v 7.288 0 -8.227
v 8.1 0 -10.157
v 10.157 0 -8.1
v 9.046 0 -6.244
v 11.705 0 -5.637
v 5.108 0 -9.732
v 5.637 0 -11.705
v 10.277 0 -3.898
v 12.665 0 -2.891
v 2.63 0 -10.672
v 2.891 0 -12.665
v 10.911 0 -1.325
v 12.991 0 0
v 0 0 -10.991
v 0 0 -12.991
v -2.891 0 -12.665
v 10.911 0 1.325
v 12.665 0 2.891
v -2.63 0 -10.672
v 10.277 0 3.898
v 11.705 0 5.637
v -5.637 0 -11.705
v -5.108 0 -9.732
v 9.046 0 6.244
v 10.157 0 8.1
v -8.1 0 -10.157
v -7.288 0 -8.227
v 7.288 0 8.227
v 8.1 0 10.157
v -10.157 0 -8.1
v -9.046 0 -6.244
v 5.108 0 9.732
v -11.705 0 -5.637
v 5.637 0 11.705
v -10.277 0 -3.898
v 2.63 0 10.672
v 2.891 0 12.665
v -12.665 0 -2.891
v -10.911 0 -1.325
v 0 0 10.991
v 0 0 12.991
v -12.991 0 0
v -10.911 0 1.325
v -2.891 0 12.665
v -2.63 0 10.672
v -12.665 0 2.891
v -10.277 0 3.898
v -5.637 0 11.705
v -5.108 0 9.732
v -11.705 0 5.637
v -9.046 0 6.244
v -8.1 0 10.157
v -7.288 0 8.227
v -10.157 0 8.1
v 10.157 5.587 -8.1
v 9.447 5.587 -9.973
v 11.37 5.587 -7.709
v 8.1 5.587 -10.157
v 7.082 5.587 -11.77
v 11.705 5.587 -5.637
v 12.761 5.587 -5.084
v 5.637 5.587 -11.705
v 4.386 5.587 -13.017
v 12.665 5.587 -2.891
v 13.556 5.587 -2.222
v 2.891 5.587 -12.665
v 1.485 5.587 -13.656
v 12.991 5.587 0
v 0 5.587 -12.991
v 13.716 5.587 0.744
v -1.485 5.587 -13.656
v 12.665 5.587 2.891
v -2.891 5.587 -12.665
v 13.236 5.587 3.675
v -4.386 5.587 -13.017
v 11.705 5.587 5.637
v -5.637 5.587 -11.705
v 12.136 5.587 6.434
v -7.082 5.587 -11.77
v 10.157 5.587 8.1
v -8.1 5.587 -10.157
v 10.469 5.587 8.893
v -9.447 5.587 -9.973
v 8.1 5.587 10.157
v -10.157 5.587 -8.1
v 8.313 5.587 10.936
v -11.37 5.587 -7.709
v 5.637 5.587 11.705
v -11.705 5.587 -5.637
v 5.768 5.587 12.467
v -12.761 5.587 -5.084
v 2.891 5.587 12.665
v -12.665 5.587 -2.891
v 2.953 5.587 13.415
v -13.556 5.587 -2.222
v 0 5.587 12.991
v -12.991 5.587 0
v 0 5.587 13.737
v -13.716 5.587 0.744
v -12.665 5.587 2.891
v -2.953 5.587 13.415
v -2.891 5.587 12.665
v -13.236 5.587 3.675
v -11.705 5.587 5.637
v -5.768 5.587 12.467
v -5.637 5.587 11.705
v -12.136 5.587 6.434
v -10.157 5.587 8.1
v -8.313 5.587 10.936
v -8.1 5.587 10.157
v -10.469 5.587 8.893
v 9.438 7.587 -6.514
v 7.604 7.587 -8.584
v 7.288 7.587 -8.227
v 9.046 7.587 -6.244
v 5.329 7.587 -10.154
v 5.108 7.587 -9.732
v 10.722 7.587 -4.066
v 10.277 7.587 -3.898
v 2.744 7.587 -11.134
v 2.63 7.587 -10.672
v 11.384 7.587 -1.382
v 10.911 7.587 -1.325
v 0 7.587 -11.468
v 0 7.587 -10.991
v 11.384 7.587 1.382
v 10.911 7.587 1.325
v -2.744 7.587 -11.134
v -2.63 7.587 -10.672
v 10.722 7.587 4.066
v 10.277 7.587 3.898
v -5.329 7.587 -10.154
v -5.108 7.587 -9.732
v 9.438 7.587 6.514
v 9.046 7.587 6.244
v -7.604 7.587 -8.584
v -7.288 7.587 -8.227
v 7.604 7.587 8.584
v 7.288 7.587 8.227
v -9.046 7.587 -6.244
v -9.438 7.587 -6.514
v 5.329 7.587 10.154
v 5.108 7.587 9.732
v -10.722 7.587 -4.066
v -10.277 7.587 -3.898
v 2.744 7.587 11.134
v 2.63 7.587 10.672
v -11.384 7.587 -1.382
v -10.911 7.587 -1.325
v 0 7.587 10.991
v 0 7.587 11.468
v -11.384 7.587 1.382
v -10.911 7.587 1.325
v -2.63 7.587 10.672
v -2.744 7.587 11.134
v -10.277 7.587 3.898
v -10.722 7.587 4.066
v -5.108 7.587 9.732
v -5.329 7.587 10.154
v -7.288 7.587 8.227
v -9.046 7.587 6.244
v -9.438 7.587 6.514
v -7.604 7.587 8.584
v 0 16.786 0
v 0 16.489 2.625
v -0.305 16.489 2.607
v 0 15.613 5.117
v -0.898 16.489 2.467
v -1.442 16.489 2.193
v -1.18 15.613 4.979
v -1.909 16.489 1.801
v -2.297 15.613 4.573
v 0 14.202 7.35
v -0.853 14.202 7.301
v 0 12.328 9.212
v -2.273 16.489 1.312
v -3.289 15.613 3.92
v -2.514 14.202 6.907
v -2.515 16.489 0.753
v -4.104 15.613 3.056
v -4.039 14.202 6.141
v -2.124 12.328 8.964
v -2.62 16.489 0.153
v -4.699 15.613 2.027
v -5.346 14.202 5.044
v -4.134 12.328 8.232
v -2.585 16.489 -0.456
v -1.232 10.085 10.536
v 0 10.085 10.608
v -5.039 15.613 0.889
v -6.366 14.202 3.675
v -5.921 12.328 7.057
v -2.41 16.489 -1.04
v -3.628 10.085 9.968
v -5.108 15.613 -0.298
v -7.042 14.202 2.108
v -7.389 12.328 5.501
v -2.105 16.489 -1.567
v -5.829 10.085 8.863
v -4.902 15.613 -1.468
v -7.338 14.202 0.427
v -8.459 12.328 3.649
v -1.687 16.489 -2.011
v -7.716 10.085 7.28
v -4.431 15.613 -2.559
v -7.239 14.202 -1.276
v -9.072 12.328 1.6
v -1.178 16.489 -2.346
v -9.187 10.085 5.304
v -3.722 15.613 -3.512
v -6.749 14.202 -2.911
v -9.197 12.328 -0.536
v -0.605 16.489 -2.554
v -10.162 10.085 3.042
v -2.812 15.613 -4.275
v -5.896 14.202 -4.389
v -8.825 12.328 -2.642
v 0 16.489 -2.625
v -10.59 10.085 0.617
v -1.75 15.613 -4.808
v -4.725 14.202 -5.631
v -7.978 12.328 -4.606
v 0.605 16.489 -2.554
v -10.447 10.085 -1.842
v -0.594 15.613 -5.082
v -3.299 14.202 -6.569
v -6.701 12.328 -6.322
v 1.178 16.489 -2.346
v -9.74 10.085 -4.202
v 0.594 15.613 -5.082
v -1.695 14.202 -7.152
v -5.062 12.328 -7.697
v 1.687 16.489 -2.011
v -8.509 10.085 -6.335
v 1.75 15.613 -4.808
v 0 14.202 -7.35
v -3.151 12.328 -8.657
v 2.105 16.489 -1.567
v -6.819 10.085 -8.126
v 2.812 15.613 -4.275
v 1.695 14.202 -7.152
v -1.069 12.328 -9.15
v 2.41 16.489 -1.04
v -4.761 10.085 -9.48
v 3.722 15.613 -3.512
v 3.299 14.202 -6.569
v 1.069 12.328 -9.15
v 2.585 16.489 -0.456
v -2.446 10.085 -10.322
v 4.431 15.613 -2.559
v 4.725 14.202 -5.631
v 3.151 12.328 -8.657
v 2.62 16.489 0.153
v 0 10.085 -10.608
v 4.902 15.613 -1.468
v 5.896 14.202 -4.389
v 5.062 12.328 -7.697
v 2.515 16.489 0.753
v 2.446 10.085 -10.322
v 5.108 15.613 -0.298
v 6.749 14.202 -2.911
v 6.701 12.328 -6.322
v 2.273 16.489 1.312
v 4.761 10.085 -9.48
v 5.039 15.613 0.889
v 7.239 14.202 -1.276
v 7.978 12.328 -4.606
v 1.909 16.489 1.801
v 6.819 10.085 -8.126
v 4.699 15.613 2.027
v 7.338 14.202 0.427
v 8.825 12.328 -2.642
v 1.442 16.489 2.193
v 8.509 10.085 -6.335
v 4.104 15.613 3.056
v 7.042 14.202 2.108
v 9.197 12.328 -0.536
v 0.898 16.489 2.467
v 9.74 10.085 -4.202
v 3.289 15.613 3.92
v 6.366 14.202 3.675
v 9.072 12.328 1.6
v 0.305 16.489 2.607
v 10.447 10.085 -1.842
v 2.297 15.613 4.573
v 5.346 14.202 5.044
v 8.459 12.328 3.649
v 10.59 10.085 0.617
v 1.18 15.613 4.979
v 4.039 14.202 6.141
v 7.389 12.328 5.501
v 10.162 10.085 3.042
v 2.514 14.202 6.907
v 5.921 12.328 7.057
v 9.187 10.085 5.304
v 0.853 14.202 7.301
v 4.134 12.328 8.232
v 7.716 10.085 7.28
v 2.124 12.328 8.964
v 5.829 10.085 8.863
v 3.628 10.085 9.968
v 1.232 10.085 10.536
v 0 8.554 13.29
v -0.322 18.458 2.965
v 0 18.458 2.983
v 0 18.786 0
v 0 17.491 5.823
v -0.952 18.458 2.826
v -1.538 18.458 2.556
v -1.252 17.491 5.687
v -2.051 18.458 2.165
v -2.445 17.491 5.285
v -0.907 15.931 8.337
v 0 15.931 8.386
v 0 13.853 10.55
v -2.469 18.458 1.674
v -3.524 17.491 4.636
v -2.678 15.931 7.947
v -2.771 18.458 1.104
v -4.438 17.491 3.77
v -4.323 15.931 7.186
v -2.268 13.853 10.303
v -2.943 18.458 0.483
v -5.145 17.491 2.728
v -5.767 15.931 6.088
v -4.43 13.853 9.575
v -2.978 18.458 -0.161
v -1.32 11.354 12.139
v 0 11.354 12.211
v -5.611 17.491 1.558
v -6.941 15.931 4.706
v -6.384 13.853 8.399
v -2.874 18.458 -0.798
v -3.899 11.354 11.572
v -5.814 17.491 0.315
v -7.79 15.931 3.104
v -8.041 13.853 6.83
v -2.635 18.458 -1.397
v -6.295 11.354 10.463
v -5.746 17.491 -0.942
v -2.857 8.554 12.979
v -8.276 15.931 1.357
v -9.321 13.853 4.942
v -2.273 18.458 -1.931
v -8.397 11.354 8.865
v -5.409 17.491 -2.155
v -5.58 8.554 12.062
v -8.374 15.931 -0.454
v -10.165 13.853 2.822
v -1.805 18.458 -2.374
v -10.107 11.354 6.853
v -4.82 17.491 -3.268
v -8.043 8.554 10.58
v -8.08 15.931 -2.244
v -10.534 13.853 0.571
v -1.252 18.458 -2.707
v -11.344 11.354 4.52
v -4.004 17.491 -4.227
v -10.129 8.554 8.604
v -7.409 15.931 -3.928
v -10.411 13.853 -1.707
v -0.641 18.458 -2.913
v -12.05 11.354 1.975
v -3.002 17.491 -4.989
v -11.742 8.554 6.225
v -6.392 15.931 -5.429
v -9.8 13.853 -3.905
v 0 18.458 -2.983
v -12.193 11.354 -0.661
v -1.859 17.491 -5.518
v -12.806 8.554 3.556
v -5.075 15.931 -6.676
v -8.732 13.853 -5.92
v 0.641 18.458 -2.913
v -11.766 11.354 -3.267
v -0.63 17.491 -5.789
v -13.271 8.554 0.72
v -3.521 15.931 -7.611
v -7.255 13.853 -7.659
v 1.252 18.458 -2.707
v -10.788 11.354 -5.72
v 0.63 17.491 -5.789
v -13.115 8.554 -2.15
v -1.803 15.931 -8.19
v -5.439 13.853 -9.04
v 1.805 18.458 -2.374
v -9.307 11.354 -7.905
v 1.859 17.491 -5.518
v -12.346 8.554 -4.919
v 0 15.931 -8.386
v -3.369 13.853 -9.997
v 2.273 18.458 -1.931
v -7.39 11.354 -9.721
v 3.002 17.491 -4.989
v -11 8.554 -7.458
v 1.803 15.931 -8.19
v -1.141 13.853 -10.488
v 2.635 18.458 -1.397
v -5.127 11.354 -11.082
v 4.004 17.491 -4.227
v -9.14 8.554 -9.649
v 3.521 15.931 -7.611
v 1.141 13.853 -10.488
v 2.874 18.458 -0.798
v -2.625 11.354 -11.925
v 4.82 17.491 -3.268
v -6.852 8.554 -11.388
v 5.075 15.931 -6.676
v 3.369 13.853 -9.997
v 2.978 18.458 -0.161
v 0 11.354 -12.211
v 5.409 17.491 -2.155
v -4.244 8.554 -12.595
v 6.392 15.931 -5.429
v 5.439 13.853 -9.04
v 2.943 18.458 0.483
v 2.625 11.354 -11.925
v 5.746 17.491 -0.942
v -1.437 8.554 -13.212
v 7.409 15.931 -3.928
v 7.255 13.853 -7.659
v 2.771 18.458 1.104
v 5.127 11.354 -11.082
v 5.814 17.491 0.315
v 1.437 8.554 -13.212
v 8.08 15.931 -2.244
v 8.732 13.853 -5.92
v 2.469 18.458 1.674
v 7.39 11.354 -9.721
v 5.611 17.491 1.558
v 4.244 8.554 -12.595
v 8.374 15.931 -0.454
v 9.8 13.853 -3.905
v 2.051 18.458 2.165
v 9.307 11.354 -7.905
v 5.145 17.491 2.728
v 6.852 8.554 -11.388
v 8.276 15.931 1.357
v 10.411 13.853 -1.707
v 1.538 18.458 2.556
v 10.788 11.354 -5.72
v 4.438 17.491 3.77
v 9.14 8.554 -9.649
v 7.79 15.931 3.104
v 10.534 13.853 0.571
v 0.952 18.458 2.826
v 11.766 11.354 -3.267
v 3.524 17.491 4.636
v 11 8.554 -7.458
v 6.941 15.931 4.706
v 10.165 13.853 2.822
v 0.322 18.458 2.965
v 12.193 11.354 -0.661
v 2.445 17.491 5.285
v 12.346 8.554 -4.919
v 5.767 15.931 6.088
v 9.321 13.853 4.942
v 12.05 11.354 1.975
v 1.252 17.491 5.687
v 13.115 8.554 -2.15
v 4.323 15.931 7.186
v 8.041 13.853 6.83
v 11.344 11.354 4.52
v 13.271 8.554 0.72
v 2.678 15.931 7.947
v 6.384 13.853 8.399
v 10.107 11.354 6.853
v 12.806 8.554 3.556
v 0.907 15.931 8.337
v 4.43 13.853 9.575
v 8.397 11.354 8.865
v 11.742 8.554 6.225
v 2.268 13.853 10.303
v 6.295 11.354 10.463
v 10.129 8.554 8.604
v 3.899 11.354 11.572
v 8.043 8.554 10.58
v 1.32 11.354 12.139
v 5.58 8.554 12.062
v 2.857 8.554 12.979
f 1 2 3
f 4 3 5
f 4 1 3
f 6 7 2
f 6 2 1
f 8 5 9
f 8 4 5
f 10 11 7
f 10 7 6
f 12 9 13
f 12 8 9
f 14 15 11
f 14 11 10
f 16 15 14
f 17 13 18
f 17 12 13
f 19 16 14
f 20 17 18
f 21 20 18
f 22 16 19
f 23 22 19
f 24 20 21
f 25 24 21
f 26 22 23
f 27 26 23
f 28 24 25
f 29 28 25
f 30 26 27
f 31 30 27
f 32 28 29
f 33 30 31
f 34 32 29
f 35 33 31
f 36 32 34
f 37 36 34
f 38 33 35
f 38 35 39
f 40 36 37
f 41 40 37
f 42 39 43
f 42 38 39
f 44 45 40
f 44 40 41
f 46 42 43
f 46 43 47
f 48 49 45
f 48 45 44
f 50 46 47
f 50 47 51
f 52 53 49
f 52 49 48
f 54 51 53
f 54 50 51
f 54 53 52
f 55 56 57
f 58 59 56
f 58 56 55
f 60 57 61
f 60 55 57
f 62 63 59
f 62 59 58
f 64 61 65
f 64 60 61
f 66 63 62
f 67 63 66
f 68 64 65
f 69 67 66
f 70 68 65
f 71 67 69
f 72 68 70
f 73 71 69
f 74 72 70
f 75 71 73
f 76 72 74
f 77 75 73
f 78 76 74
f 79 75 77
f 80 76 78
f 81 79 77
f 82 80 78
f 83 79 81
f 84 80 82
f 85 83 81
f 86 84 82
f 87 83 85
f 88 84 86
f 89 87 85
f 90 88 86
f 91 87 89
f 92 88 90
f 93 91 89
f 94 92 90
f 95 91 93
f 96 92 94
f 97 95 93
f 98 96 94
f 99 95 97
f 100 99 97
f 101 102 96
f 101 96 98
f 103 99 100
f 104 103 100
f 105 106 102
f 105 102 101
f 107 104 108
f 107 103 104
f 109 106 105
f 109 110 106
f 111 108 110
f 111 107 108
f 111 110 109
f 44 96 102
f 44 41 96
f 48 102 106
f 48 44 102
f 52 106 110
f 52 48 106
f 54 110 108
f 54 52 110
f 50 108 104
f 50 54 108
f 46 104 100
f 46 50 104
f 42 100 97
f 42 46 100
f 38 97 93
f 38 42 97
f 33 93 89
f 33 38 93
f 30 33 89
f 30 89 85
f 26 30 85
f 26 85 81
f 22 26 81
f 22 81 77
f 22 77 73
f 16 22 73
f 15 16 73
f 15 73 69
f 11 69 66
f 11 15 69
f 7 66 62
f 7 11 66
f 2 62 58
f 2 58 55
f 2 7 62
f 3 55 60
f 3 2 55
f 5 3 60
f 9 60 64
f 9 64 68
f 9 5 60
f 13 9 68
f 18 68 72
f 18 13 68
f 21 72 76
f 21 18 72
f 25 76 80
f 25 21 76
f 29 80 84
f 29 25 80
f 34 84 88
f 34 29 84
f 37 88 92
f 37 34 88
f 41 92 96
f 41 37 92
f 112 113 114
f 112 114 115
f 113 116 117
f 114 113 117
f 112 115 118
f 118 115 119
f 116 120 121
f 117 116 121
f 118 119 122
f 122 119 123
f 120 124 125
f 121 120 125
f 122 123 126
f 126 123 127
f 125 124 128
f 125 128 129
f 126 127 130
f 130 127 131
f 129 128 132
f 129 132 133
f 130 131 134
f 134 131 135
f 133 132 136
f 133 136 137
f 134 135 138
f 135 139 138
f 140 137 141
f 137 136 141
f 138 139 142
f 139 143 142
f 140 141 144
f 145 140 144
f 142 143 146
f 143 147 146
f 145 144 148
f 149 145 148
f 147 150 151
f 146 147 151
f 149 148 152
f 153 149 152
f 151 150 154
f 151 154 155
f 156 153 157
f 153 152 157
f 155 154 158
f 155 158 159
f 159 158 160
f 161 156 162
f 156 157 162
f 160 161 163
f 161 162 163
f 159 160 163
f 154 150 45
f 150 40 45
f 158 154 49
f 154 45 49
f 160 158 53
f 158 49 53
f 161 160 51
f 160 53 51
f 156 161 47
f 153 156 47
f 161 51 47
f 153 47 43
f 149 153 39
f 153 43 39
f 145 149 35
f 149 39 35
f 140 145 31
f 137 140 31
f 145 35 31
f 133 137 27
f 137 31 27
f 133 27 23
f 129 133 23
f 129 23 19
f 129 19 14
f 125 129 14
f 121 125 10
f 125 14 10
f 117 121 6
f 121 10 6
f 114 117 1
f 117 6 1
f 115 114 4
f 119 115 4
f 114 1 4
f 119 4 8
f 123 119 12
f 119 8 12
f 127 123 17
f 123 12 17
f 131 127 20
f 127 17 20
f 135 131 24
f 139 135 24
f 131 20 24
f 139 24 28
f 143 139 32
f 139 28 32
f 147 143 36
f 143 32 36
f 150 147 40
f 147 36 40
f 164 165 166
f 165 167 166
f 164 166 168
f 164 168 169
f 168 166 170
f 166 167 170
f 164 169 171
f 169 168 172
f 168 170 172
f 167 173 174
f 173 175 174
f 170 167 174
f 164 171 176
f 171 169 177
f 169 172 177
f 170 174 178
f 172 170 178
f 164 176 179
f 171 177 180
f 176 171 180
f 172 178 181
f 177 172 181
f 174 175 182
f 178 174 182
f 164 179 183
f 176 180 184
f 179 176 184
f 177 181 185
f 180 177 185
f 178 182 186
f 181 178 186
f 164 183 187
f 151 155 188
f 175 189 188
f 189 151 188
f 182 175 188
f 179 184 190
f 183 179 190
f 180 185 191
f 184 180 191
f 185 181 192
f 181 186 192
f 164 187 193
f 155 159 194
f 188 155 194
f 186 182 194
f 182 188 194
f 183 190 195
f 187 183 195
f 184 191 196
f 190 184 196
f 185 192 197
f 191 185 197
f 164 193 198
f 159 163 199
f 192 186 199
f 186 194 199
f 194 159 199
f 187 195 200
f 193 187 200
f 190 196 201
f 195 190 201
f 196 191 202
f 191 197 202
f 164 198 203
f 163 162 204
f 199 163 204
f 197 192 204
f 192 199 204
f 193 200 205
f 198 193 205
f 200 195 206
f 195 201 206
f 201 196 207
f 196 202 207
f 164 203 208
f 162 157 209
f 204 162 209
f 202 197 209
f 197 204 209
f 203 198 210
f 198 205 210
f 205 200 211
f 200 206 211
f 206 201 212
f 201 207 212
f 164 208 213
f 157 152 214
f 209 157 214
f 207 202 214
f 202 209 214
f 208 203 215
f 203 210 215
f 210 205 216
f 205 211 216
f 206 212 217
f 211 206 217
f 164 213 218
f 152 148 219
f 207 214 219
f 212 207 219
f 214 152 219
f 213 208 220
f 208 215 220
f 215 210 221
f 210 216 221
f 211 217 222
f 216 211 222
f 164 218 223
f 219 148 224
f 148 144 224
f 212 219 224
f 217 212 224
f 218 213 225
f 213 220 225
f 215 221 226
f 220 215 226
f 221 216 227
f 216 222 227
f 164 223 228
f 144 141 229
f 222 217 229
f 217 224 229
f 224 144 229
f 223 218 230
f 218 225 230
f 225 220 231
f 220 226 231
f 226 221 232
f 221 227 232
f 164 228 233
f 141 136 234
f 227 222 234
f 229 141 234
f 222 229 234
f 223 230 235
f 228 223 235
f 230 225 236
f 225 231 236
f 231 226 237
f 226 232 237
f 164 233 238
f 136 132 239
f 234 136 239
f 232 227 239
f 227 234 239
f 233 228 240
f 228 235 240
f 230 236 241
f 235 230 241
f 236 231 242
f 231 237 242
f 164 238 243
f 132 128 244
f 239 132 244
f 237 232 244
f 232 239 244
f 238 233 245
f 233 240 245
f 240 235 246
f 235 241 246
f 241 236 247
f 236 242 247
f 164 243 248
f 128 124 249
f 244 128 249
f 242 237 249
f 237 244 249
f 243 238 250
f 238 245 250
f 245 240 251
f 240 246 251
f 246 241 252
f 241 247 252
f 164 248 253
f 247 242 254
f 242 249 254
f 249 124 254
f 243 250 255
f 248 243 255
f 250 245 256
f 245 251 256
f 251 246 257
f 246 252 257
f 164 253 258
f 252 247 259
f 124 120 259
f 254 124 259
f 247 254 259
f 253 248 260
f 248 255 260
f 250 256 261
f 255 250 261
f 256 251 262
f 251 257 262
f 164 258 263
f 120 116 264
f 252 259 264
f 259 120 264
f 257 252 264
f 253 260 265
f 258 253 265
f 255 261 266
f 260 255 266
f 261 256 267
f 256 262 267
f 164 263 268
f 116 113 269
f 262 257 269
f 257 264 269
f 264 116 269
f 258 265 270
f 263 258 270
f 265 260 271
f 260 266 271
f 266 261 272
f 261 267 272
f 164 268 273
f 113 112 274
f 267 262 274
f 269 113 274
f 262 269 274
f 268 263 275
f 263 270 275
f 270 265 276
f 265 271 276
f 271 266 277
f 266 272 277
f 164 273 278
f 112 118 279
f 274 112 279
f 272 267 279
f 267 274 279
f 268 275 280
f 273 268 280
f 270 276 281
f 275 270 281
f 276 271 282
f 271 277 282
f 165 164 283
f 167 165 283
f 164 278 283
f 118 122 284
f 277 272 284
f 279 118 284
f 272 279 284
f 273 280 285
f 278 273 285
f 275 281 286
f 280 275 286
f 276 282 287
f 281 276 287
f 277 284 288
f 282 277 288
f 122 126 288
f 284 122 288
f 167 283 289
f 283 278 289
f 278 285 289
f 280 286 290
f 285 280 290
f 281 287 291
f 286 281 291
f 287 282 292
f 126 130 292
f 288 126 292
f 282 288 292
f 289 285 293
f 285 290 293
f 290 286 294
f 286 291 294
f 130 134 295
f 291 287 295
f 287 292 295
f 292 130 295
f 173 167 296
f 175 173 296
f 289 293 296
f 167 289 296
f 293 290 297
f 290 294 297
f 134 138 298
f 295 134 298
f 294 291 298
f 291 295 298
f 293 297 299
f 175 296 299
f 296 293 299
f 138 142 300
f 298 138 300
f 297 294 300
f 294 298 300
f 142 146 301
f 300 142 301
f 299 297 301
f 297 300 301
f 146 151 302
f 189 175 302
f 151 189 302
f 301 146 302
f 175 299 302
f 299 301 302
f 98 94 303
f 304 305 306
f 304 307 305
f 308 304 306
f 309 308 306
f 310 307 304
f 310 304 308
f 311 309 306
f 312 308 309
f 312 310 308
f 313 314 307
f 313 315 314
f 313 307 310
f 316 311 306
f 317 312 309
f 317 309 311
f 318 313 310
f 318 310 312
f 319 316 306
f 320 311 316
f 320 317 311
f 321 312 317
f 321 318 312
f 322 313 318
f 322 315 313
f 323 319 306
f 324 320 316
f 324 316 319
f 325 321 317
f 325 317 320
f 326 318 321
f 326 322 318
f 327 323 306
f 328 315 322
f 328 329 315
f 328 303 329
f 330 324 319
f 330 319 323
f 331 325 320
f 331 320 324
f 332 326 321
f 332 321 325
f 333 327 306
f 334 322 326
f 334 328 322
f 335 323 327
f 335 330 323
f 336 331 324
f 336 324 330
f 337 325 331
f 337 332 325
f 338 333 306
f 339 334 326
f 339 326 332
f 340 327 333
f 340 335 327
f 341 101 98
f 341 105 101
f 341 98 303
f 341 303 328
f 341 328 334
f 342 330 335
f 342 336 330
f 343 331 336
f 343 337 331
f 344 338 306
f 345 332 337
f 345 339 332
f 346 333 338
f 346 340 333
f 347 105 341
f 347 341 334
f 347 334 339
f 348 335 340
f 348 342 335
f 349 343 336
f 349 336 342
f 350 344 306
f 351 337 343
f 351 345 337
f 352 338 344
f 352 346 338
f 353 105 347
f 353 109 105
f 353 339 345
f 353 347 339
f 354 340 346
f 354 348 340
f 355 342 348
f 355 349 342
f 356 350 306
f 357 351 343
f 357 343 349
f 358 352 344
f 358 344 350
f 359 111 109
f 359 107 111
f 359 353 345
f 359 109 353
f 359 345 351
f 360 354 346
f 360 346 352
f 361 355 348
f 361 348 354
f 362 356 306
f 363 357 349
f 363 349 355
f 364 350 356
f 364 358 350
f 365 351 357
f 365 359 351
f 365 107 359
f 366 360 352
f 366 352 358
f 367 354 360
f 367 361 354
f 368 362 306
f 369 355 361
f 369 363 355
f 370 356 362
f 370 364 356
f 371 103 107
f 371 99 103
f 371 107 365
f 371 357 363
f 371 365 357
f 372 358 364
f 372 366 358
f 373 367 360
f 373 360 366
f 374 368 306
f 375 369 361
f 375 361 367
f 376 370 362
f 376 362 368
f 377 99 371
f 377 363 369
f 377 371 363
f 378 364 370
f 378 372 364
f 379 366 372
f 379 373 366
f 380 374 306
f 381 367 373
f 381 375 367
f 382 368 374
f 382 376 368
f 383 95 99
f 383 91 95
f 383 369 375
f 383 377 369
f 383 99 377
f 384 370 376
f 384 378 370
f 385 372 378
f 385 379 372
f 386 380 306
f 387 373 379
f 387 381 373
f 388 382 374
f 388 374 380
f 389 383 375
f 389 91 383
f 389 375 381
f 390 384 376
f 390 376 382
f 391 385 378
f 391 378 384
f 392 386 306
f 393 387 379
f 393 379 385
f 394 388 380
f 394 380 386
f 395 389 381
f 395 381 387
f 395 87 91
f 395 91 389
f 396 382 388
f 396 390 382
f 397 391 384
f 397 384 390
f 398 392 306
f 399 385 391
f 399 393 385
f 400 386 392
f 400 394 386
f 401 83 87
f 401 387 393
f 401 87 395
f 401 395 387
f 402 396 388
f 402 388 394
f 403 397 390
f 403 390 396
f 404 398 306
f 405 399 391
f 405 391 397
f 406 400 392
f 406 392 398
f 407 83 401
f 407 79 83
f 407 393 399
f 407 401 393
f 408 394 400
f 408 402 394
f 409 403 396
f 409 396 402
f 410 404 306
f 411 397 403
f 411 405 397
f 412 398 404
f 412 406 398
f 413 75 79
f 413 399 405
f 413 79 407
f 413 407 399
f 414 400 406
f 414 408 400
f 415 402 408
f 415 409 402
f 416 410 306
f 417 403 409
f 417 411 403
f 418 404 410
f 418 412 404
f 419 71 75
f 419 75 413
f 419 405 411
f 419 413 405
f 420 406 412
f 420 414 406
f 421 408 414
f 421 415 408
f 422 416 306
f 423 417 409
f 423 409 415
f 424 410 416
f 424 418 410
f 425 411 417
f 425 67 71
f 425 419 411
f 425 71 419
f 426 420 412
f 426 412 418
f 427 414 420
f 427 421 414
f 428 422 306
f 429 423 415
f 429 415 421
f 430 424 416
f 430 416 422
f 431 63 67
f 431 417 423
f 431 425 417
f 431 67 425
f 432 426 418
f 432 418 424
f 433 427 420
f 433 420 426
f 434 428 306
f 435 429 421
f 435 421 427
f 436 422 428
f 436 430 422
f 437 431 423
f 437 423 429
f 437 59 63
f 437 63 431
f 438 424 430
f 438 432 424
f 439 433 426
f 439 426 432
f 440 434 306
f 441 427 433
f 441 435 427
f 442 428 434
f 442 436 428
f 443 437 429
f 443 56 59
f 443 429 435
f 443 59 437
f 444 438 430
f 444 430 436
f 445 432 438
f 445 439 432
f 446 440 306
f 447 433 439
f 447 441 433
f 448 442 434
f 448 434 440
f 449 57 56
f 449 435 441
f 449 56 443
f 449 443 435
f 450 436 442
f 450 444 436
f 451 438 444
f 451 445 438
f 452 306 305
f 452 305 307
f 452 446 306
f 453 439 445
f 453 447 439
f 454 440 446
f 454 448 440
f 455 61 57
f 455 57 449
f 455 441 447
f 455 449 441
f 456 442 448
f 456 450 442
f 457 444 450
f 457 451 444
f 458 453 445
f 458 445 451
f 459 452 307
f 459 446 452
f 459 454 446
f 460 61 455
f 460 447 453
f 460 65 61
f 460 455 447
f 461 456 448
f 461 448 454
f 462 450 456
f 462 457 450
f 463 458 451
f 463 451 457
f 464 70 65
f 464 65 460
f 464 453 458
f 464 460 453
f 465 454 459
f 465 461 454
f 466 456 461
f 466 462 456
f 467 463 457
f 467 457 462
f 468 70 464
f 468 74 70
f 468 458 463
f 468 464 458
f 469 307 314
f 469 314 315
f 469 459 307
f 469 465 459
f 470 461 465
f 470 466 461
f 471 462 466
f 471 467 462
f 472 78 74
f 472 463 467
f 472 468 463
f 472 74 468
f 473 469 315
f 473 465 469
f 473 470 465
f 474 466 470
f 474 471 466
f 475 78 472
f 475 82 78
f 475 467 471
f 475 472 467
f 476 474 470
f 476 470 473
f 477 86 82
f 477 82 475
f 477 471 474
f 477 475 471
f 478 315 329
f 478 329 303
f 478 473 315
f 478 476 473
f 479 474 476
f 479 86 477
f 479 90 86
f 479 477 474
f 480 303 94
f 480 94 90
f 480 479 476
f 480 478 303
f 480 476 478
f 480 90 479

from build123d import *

# Parameters (mm, degrees)
F2_T = -2


with BuildPart() as f1:
    # F0 (on Right) → F1 (revolve)
    with BuildSketch(Plane.YZ):
        with BuildLine():
            Line((5.5872295052, 12.9911601543), (0, 12.9911601543))
            Line((0, 12.9911601543), (0, 0))
            Line((0, 0), (18.7855159319, 0))
            ThreePointArc((18.7855159319, 0), (14.9512416834, 9.5247982797), (5.5872295052, 13.7365339324))
            Line((5.5872295052, 13.7365339324), (5.5872295052, 12.9911601543))
        make_face()
    revolve(axis=Axis((0, 9.392757966, 0), (0, -1, 0)))

    # F2
    f2_openings = [f1.faces().sort_by_distance(p)[0] for p in [
        (0, 0, 0),
    ]]
    offset(amount=F2_T, openings=f2_openings, kind=Kind.INTERSECTION)


solid = f1.part
